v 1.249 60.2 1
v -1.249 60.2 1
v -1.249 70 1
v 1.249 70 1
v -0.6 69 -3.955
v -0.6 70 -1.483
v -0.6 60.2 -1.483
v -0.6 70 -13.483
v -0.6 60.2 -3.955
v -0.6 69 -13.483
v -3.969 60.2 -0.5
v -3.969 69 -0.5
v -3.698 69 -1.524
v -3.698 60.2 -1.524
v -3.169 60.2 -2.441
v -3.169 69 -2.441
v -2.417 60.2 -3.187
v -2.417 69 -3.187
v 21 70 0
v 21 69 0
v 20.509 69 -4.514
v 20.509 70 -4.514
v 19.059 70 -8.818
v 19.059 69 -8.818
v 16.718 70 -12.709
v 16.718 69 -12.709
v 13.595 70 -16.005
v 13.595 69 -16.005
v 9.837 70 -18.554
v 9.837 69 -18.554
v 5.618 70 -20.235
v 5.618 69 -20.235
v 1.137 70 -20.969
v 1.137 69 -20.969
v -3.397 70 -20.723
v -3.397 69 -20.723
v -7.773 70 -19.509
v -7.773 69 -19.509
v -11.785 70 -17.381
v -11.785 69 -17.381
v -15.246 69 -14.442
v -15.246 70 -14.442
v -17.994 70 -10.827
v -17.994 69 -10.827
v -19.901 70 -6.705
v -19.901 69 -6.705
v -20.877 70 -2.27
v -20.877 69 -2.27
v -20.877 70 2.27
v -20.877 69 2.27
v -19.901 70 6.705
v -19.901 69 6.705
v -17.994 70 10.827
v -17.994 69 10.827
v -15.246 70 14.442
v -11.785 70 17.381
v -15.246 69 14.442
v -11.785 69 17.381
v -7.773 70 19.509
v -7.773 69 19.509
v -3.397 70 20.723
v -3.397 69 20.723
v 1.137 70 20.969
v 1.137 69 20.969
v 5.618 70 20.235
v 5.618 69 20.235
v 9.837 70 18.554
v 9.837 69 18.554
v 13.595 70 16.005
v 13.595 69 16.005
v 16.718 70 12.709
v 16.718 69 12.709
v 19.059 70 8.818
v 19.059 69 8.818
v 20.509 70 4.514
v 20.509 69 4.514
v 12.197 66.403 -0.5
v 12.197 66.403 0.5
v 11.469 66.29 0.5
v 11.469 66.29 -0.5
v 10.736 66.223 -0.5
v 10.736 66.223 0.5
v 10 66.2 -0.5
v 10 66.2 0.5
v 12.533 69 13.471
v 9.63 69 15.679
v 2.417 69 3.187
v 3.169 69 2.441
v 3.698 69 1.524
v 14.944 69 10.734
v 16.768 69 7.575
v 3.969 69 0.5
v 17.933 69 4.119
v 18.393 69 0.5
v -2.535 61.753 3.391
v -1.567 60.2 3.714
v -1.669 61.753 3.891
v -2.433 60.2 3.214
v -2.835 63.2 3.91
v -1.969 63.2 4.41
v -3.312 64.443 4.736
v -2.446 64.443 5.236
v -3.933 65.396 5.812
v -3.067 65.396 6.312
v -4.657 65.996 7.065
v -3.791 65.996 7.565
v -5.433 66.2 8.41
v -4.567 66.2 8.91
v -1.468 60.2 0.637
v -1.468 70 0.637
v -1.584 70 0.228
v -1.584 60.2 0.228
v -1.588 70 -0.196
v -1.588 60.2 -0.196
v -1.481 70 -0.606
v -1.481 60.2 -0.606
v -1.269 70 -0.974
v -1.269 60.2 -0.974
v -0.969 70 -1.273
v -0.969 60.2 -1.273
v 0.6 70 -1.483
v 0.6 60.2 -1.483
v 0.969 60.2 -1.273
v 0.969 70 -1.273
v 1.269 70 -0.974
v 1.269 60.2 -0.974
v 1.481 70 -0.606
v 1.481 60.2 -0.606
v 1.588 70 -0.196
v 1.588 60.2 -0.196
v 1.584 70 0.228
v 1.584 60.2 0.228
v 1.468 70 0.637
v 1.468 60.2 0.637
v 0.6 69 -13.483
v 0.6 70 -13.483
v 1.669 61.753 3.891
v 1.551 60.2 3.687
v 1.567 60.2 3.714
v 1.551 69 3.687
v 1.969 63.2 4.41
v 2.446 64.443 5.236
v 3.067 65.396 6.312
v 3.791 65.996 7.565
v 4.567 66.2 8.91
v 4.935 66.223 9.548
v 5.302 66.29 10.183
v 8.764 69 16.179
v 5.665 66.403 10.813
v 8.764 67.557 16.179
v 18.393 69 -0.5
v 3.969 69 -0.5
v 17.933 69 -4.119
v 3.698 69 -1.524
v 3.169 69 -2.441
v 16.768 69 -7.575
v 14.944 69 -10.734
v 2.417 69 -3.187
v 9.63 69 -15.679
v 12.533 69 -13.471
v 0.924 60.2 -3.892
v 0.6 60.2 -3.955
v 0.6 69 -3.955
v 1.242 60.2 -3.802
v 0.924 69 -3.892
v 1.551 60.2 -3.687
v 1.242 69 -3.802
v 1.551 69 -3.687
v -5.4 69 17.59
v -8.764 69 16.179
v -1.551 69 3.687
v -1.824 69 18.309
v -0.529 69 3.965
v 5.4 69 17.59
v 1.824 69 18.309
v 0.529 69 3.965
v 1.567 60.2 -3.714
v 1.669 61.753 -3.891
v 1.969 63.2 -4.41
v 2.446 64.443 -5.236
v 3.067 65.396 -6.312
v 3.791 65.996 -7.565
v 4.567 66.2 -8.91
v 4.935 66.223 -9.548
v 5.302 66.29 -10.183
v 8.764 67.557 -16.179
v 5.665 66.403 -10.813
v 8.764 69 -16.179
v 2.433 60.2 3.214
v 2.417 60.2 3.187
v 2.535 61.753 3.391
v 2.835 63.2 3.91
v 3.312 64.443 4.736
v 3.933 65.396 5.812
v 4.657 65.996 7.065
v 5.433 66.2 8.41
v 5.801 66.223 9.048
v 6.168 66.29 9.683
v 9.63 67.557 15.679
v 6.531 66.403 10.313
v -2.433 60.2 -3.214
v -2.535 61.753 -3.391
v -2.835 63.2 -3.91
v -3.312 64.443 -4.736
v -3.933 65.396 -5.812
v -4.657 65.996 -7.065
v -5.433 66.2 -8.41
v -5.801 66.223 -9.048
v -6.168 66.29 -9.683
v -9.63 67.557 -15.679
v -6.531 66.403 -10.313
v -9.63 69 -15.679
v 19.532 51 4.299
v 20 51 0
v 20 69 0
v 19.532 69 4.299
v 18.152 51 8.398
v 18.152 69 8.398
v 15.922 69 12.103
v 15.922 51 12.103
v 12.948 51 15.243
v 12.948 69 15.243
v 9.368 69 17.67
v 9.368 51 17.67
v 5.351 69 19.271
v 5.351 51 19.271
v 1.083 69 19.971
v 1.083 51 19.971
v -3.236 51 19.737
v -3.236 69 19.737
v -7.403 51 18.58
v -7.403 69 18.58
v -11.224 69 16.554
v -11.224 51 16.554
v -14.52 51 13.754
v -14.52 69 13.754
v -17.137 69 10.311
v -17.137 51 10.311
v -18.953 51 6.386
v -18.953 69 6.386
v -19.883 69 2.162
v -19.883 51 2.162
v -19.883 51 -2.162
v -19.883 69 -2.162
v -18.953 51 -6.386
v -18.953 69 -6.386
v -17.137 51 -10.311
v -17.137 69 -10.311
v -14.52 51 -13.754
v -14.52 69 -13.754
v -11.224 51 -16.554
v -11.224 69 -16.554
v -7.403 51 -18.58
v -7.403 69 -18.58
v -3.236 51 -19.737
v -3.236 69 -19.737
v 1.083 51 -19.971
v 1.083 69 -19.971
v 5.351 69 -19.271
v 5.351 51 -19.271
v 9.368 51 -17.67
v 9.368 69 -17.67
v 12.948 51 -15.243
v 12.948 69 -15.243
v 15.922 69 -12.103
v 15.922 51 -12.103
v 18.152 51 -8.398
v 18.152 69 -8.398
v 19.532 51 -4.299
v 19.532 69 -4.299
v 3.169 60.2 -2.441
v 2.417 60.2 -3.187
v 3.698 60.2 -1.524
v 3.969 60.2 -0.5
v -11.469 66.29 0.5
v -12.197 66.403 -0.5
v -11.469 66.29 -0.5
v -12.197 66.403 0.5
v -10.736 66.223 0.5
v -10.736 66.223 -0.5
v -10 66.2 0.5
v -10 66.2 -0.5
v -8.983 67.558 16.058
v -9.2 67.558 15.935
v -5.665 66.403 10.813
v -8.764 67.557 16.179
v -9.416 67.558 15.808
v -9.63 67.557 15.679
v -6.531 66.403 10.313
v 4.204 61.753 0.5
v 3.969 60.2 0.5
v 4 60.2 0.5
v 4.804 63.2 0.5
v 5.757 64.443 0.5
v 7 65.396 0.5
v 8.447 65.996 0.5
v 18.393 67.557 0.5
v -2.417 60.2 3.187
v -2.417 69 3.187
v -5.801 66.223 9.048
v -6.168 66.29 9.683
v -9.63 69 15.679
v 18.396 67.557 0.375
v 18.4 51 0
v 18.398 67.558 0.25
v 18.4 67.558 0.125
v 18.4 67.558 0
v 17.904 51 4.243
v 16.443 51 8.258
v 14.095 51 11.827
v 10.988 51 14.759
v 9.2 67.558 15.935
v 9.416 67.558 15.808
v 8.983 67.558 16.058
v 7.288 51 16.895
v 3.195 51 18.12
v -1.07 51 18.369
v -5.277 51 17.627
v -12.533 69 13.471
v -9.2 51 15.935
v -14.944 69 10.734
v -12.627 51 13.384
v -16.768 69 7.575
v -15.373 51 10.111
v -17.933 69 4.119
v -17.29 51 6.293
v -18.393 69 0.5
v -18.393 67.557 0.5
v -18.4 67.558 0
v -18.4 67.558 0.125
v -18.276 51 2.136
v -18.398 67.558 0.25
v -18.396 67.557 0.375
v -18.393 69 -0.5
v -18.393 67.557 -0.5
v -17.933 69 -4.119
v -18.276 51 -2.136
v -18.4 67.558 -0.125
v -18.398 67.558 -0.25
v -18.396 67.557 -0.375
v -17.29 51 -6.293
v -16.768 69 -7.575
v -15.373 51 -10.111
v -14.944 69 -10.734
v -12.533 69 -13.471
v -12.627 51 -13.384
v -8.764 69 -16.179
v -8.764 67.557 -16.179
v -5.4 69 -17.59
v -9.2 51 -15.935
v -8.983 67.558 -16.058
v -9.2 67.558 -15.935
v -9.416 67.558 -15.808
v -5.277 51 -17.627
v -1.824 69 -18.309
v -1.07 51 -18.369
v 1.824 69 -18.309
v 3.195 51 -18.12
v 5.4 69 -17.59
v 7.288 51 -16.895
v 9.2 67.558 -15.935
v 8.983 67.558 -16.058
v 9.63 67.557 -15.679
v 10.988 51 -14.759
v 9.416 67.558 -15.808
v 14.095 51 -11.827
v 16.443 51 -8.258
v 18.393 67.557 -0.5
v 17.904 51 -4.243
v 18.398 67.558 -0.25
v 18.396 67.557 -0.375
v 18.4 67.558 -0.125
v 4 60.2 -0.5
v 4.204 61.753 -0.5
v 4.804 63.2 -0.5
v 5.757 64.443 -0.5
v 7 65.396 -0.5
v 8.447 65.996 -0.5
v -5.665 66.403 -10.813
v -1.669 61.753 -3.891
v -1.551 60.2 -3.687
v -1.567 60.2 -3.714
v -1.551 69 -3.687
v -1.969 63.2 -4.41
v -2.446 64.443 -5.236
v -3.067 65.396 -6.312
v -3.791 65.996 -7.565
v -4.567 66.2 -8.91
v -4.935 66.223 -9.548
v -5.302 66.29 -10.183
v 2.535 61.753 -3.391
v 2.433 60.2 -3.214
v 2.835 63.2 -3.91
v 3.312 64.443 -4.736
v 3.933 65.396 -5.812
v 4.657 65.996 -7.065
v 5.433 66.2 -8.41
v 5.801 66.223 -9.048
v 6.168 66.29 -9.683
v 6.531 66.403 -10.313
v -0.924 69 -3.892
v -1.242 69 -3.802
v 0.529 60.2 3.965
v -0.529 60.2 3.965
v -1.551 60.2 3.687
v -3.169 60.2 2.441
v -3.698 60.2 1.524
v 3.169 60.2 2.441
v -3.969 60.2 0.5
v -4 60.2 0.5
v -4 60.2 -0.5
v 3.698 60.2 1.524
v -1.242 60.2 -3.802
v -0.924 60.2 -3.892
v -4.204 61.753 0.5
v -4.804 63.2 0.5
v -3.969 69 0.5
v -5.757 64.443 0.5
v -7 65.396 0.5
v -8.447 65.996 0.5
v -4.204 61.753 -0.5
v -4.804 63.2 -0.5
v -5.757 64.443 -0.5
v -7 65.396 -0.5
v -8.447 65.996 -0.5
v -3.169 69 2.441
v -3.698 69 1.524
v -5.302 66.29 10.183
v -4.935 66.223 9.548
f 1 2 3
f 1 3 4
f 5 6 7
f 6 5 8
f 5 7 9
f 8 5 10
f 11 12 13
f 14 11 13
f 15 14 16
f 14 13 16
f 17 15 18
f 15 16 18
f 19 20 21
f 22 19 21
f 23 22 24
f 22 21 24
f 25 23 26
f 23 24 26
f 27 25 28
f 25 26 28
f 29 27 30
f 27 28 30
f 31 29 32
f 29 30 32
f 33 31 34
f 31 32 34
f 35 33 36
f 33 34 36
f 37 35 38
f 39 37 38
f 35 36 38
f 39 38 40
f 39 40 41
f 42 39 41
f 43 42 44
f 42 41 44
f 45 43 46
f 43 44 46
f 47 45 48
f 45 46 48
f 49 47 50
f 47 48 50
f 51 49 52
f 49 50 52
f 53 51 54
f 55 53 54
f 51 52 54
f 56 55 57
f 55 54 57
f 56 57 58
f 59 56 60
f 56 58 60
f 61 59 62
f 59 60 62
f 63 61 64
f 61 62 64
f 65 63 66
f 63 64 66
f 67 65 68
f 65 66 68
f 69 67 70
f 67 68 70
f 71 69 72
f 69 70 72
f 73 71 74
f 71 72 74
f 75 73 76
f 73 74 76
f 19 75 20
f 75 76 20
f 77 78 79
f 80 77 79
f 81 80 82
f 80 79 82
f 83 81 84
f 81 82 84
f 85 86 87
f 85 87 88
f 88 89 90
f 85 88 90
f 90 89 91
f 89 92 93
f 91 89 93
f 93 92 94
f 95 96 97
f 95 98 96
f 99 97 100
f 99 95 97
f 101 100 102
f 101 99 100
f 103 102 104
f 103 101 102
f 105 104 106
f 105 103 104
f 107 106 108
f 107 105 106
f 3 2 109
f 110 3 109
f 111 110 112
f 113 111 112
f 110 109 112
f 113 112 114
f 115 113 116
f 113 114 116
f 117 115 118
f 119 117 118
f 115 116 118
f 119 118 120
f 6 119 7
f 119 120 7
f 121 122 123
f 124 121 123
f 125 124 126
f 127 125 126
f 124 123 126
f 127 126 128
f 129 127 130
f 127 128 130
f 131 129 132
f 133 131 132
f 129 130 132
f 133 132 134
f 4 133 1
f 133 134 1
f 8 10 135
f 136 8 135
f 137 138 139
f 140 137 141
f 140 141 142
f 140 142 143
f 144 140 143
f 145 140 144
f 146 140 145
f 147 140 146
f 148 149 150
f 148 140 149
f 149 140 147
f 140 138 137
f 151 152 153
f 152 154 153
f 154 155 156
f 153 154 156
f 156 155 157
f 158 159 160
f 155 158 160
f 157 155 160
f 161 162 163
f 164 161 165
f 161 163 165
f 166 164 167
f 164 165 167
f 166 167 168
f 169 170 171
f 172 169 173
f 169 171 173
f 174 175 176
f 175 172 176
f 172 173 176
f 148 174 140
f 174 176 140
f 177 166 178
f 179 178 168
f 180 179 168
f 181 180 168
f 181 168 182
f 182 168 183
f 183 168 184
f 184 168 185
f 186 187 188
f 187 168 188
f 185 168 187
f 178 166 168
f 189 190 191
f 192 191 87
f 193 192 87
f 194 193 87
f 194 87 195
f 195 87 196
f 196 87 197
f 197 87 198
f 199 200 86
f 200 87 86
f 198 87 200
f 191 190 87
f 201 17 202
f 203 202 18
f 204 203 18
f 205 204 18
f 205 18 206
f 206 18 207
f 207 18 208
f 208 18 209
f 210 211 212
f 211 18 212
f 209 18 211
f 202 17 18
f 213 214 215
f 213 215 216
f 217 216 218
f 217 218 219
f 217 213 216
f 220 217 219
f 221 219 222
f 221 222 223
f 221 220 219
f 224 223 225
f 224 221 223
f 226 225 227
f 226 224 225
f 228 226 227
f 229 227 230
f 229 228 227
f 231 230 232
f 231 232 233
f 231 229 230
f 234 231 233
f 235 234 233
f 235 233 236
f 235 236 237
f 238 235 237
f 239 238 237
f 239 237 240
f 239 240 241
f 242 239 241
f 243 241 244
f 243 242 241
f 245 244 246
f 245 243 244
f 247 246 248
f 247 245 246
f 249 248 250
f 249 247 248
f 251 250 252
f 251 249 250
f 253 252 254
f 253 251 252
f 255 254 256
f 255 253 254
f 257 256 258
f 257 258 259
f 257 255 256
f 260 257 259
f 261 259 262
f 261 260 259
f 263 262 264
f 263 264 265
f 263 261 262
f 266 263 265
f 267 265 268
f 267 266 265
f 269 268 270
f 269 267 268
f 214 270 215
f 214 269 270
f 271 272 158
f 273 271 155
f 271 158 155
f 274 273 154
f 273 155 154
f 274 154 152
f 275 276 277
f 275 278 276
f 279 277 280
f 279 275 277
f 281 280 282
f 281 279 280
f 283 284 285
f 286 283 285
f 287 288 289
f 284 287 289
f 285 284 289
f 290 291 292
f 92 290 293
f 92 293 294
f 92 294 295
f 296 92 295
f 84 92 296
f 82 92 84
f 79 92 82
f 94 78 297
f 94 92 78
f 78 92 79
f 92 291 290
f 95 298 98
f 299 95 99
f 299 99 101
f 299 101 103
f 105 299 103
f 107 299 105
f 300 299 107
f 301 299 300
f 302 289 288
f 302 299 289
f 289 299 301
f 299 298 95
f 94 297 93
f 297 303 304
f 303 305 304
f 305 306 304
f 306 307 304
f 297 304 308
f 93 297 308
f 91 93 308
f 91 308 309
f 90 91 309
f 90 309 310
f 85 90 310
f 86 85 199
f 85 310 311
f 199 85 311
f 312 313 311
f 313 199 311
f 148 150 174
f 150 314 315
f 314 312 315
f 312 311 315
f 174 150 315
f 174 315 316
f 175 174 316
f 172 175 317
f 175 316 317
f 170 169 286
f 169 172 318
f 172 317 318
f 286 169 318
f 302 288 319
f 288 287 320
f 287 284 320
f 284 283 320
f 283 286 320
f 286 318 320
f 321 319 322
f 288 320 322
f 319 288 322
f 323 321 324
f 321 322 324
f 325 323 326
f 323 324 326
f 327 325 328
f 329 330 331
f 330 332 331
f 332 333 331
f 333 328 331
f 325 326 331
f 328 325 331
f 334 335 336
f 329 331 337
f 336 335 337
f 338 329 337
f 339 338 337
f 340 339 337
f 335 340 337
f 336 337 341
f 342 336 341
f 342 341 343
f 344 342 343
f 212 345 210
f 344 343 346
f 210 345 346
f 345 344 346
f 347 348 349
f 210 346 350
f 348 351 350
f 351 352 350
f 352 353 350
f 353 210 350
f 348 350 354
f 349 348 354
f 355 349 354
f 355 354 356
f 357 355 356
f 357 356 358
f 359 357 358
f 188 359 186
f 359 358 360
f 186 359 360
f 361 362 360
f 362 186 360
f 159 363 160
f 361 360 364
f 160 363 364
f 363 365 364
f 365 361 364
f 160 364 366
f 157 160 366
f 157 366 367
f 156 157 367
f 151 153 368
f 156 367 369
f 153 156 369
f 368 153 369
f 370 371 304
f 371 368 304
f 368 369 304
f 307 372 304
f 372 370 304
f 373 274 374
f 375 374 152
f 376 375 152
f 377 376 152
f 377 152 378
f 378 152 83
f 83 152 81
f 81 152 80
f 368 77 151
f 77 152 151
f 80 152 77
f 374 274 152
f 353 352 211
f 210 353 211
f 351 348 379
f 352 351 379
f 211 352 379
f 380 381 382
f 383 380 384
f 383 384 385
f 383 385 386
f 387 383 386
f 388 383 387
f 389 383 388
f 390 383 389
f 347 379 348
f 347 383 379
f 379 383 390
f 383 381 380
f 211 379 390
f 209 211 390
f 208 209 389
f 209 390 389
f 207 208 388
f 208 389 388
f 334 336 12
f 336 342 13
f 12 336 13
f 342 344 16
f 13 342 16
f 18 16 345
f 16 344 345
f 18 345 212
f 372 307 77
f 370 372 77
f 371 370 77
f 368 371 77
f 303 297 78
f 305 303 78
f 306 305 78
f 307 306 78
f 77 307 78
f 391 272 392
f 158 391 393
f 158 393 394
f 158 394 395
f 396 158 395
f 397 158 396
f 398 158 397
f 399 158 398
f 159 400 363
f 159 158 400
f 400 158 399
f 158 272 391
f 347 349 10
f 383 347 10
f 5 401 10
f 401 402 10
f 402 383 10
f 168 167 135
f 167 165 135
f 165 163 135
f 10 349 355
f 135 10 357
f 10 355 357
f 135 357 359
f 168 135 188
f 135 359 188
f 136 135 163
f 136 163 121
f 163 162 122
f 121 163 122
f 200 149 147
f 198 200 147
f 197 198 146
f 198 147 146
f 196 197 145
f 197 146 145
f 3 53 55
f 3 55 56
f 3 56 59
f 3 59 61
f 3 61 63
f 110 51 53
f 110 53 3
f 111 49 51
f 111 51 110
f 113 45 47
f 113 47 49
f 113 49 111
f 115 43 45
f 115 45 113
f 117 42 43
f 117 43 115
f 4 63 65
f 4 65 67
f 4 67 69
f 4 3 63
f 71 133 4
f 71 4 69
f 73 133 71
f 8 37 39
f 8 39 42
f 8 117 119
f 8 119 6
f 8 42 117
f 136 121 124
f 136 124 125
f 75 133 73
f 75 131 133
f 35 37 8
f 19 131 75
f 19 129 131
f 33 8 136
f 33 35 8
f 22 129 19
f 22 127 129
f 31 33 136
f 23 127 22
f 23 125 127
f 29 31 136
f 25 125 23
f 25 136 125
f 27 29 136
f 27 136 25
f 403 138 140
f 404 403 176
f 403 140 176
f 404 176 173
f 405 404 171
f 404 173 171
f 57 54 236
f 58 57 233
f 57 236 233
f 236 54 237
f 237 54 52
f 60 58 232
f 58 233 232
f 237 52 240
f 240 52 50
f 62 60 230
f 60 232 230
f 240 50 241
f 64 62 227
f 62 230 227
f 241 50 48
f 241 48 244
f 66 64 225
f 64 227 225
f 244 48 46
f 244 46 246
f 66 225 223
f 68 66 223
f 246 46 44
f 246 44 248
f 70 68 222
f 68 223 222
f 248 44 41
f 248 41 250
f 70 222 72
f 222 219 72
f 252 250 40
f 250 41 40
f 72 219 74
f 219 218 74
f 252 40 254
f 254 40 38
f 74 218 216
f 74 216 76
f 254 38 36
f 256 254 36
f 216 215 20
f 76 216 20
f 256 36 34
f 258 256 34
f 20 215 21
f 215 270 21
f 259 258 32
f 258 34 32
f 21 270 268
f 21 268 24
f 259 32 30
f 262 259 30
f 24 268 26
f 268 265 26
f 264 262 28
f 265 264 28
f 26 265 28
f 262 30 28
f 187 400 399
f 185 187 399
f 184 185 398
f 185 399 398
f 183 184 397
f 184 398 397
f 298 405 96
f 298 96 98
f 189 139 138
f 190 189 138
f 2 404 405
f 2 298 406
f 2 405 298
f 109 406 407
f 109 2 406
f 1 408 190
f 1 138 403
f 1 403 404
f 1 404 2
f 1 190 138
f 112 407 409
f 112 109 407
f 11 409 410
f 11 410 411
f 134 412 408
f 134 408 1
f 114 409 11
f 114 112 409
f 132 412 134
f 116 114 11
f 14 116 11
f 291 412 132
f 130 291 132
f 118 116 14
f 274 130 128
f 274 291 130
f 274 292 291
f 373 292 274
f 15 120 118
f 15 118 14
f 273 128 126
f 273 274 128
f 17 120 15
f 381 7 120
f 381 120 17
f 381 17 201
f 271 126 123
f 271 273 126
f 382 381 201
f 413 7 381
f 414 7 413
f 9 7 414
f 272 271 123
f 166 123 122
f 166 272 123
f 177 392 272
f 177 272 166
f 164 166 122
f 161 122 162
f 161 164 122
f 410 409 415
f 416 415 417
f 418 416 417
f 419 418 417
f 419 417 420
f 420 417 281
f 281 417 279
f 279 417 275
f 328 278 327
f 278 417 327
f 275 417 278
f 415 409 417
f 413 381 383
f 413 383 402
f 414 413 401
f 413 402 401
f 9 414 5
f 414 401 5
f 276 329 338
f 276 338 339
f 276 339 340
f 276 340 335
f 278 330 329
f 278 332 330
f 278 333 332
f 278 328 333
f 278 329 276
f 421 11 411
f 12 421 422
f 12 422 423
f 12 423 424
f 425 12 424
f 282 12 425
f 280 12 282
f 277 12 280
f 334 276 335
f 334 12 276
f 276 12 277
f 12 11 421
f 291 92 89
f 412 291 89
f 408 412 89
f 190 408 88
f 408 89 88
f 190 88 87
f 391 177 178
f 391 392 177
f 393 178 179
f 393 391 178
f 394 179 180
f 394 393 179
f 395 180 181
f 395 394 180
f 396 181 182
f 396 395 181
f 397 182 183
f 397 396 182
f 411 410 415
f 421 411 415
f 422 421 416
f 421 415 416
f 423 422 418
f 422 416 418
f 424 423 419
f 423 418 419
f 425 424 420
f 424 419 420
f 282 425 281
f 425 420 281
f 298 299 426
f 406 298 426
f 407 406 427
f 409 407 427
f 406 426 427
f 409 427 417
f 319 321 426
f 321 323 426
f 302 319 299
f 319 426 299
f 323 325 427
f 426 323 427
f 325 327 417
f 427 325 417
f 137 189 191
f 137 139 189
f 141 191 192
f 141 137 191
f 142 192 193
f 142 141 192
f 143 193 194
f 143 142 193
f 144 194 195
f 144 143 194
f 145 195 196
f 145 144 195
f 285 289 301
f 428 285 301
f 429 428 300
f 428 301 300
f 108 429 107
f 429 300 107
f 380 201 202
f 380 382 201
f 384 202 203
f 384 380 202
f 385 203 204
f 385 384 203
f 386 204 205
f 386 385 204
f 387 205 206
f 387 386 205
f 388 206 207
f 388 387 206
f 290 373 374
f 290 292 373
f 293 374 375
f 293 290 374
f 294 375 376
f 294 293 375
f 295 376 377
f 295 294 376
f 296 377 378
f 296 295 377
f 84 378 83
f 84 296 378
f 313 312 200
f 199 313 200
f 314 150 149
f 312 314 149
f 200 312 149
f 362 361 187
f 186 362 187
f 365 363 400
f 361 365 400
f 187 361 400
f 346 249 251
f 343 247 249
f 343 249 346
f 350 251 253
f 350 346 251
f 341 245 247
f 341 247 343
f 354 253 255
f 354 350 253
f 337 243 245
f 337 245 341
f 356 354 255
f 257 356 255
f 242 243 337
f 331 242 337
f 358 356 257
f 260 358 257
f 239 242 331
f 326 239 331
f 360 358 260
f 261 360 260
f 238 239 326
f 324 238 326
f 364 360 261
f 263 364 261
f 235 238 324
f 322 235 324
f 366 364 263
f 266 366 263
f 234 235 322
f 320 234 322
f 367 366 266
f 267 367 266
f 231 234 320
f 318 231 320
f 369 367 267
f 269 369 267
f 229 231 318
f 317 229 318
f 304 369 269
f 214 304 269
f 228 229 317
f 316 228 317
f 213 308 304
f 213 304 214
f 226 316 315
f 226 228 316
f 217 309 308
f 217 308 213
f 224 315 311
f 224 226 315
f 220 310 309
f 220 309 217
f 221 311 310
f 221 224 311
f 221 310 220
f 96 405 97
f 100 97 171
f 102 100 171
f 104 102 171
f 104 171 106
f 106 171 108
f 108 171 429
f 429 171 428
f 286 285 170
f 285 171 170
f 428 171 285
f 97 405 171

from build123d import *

# Parameters (mm, degrees)
PAD_START          = -51
SKETCH_R           = 20
SKETCH_R_2         = 18.4
PAD_DEPTH          = 18
SKETCH001_R        = 21
PAD001_DEPTH       = 1
SKETCH002_R        = 4
PAD002_DEPTH       = 8.8
POCKET_DEPTH       = 9.801
PAD003_DEPTH       = 0.5
PAD003_DEPTH_BACK  = 0.5
POLARPATTERN_COUNT = 6


with BuildPart() as part:
    # Sketch → Pad (new body)
    with BuildSketch(Plane.XZ.offset(PAD_START)):
        Circle(SKETCH_R)
        Circle(SKETCH_R_2, mode=Mode.SUBTRACT)
    extrude(amount=-PAD_DEPTH)

    # Sketch001 (on Face3 of Pad) → Pad001 (join)
    with BuildSketch(Plane(origin=(0, 69, 0), x_dir=(1, 0, 0), z_dir=(0, 1, 0))):
        Circle(SKETCH001_R)
    extrude(amount=PAD001_DEPTH)

    # Sketch002 (on Face7 of Pad001) → Pad002 (join)
    with BuildSketch(Plane.XZ.offset(-69)):
        Circle(SKETCH002_R)
    extrude(amount=PAD002_DEPTH)

    # Sketch003 (on Face9 of Pad002) → Pocket (cut, through all)
    with BuildSketch(Plane.XZ.offset(-60.2)):
        with BuildLine():
            ThreePointArc((-1.249, 1), (-1.548005, -0.404574), (-0.6, -1.48324))
            Line((-0.6, -1.48324), (-0.6, -13.48324))
            Line((-0.6, -13.48324), (0.6, -13.48324))
            Line((0.6, -13.48324), (0.6, -1.48324))
            ThreePointArc((0.6, -1.48324), (1.548005, -0.404574), (1.249, 1))
            Line((-1.249, 1), (1.249, 1))
        make_face()
    extrude(amount=-POCKET_DEPTH, mode=Mode.SUBTRACT)

    # Sketch004 → Pad003 (join, two sides)
    with BuildSketch(Plane.XY) as pad003_sk:
        with BuildLine():
            ThreePointArc((-4, 60.2), (-5.757359, 64.442641), (-10, 66.2))
            ThreePointArc((-12.196813, 66.402796), (-11.103077, 66.250807), (-10, 66.2))
            Line((-19.7, 67.8), (-12.196813, 66.402796))
            Line((-19.7, 69), (-19.7, 67.8))
            Line((-19.7, 69), (-3.5, 69))
            Line((-3.5, 69), (-3.5, 60.2))
            Line((-3.5, 60.2), (-4, 60.2))
        make_face()
    pad003 = extrude(amount=PAD003_DEPTH) + extrude(pad003_sk.sketch, amount=-PAD003_DEPTH_BACK)

    # PolarPattern: Pad003 ×6 about axis
    polarpattern_axis = Axis((0, 0, 0), (0, 1, 0))
    for i in range(1, POLARPATTERN_COUNT):
        add(pad003.rotate(polarpattern_axis, i * 360 / POLARPATTERN_COUNT))


solid = part.part
